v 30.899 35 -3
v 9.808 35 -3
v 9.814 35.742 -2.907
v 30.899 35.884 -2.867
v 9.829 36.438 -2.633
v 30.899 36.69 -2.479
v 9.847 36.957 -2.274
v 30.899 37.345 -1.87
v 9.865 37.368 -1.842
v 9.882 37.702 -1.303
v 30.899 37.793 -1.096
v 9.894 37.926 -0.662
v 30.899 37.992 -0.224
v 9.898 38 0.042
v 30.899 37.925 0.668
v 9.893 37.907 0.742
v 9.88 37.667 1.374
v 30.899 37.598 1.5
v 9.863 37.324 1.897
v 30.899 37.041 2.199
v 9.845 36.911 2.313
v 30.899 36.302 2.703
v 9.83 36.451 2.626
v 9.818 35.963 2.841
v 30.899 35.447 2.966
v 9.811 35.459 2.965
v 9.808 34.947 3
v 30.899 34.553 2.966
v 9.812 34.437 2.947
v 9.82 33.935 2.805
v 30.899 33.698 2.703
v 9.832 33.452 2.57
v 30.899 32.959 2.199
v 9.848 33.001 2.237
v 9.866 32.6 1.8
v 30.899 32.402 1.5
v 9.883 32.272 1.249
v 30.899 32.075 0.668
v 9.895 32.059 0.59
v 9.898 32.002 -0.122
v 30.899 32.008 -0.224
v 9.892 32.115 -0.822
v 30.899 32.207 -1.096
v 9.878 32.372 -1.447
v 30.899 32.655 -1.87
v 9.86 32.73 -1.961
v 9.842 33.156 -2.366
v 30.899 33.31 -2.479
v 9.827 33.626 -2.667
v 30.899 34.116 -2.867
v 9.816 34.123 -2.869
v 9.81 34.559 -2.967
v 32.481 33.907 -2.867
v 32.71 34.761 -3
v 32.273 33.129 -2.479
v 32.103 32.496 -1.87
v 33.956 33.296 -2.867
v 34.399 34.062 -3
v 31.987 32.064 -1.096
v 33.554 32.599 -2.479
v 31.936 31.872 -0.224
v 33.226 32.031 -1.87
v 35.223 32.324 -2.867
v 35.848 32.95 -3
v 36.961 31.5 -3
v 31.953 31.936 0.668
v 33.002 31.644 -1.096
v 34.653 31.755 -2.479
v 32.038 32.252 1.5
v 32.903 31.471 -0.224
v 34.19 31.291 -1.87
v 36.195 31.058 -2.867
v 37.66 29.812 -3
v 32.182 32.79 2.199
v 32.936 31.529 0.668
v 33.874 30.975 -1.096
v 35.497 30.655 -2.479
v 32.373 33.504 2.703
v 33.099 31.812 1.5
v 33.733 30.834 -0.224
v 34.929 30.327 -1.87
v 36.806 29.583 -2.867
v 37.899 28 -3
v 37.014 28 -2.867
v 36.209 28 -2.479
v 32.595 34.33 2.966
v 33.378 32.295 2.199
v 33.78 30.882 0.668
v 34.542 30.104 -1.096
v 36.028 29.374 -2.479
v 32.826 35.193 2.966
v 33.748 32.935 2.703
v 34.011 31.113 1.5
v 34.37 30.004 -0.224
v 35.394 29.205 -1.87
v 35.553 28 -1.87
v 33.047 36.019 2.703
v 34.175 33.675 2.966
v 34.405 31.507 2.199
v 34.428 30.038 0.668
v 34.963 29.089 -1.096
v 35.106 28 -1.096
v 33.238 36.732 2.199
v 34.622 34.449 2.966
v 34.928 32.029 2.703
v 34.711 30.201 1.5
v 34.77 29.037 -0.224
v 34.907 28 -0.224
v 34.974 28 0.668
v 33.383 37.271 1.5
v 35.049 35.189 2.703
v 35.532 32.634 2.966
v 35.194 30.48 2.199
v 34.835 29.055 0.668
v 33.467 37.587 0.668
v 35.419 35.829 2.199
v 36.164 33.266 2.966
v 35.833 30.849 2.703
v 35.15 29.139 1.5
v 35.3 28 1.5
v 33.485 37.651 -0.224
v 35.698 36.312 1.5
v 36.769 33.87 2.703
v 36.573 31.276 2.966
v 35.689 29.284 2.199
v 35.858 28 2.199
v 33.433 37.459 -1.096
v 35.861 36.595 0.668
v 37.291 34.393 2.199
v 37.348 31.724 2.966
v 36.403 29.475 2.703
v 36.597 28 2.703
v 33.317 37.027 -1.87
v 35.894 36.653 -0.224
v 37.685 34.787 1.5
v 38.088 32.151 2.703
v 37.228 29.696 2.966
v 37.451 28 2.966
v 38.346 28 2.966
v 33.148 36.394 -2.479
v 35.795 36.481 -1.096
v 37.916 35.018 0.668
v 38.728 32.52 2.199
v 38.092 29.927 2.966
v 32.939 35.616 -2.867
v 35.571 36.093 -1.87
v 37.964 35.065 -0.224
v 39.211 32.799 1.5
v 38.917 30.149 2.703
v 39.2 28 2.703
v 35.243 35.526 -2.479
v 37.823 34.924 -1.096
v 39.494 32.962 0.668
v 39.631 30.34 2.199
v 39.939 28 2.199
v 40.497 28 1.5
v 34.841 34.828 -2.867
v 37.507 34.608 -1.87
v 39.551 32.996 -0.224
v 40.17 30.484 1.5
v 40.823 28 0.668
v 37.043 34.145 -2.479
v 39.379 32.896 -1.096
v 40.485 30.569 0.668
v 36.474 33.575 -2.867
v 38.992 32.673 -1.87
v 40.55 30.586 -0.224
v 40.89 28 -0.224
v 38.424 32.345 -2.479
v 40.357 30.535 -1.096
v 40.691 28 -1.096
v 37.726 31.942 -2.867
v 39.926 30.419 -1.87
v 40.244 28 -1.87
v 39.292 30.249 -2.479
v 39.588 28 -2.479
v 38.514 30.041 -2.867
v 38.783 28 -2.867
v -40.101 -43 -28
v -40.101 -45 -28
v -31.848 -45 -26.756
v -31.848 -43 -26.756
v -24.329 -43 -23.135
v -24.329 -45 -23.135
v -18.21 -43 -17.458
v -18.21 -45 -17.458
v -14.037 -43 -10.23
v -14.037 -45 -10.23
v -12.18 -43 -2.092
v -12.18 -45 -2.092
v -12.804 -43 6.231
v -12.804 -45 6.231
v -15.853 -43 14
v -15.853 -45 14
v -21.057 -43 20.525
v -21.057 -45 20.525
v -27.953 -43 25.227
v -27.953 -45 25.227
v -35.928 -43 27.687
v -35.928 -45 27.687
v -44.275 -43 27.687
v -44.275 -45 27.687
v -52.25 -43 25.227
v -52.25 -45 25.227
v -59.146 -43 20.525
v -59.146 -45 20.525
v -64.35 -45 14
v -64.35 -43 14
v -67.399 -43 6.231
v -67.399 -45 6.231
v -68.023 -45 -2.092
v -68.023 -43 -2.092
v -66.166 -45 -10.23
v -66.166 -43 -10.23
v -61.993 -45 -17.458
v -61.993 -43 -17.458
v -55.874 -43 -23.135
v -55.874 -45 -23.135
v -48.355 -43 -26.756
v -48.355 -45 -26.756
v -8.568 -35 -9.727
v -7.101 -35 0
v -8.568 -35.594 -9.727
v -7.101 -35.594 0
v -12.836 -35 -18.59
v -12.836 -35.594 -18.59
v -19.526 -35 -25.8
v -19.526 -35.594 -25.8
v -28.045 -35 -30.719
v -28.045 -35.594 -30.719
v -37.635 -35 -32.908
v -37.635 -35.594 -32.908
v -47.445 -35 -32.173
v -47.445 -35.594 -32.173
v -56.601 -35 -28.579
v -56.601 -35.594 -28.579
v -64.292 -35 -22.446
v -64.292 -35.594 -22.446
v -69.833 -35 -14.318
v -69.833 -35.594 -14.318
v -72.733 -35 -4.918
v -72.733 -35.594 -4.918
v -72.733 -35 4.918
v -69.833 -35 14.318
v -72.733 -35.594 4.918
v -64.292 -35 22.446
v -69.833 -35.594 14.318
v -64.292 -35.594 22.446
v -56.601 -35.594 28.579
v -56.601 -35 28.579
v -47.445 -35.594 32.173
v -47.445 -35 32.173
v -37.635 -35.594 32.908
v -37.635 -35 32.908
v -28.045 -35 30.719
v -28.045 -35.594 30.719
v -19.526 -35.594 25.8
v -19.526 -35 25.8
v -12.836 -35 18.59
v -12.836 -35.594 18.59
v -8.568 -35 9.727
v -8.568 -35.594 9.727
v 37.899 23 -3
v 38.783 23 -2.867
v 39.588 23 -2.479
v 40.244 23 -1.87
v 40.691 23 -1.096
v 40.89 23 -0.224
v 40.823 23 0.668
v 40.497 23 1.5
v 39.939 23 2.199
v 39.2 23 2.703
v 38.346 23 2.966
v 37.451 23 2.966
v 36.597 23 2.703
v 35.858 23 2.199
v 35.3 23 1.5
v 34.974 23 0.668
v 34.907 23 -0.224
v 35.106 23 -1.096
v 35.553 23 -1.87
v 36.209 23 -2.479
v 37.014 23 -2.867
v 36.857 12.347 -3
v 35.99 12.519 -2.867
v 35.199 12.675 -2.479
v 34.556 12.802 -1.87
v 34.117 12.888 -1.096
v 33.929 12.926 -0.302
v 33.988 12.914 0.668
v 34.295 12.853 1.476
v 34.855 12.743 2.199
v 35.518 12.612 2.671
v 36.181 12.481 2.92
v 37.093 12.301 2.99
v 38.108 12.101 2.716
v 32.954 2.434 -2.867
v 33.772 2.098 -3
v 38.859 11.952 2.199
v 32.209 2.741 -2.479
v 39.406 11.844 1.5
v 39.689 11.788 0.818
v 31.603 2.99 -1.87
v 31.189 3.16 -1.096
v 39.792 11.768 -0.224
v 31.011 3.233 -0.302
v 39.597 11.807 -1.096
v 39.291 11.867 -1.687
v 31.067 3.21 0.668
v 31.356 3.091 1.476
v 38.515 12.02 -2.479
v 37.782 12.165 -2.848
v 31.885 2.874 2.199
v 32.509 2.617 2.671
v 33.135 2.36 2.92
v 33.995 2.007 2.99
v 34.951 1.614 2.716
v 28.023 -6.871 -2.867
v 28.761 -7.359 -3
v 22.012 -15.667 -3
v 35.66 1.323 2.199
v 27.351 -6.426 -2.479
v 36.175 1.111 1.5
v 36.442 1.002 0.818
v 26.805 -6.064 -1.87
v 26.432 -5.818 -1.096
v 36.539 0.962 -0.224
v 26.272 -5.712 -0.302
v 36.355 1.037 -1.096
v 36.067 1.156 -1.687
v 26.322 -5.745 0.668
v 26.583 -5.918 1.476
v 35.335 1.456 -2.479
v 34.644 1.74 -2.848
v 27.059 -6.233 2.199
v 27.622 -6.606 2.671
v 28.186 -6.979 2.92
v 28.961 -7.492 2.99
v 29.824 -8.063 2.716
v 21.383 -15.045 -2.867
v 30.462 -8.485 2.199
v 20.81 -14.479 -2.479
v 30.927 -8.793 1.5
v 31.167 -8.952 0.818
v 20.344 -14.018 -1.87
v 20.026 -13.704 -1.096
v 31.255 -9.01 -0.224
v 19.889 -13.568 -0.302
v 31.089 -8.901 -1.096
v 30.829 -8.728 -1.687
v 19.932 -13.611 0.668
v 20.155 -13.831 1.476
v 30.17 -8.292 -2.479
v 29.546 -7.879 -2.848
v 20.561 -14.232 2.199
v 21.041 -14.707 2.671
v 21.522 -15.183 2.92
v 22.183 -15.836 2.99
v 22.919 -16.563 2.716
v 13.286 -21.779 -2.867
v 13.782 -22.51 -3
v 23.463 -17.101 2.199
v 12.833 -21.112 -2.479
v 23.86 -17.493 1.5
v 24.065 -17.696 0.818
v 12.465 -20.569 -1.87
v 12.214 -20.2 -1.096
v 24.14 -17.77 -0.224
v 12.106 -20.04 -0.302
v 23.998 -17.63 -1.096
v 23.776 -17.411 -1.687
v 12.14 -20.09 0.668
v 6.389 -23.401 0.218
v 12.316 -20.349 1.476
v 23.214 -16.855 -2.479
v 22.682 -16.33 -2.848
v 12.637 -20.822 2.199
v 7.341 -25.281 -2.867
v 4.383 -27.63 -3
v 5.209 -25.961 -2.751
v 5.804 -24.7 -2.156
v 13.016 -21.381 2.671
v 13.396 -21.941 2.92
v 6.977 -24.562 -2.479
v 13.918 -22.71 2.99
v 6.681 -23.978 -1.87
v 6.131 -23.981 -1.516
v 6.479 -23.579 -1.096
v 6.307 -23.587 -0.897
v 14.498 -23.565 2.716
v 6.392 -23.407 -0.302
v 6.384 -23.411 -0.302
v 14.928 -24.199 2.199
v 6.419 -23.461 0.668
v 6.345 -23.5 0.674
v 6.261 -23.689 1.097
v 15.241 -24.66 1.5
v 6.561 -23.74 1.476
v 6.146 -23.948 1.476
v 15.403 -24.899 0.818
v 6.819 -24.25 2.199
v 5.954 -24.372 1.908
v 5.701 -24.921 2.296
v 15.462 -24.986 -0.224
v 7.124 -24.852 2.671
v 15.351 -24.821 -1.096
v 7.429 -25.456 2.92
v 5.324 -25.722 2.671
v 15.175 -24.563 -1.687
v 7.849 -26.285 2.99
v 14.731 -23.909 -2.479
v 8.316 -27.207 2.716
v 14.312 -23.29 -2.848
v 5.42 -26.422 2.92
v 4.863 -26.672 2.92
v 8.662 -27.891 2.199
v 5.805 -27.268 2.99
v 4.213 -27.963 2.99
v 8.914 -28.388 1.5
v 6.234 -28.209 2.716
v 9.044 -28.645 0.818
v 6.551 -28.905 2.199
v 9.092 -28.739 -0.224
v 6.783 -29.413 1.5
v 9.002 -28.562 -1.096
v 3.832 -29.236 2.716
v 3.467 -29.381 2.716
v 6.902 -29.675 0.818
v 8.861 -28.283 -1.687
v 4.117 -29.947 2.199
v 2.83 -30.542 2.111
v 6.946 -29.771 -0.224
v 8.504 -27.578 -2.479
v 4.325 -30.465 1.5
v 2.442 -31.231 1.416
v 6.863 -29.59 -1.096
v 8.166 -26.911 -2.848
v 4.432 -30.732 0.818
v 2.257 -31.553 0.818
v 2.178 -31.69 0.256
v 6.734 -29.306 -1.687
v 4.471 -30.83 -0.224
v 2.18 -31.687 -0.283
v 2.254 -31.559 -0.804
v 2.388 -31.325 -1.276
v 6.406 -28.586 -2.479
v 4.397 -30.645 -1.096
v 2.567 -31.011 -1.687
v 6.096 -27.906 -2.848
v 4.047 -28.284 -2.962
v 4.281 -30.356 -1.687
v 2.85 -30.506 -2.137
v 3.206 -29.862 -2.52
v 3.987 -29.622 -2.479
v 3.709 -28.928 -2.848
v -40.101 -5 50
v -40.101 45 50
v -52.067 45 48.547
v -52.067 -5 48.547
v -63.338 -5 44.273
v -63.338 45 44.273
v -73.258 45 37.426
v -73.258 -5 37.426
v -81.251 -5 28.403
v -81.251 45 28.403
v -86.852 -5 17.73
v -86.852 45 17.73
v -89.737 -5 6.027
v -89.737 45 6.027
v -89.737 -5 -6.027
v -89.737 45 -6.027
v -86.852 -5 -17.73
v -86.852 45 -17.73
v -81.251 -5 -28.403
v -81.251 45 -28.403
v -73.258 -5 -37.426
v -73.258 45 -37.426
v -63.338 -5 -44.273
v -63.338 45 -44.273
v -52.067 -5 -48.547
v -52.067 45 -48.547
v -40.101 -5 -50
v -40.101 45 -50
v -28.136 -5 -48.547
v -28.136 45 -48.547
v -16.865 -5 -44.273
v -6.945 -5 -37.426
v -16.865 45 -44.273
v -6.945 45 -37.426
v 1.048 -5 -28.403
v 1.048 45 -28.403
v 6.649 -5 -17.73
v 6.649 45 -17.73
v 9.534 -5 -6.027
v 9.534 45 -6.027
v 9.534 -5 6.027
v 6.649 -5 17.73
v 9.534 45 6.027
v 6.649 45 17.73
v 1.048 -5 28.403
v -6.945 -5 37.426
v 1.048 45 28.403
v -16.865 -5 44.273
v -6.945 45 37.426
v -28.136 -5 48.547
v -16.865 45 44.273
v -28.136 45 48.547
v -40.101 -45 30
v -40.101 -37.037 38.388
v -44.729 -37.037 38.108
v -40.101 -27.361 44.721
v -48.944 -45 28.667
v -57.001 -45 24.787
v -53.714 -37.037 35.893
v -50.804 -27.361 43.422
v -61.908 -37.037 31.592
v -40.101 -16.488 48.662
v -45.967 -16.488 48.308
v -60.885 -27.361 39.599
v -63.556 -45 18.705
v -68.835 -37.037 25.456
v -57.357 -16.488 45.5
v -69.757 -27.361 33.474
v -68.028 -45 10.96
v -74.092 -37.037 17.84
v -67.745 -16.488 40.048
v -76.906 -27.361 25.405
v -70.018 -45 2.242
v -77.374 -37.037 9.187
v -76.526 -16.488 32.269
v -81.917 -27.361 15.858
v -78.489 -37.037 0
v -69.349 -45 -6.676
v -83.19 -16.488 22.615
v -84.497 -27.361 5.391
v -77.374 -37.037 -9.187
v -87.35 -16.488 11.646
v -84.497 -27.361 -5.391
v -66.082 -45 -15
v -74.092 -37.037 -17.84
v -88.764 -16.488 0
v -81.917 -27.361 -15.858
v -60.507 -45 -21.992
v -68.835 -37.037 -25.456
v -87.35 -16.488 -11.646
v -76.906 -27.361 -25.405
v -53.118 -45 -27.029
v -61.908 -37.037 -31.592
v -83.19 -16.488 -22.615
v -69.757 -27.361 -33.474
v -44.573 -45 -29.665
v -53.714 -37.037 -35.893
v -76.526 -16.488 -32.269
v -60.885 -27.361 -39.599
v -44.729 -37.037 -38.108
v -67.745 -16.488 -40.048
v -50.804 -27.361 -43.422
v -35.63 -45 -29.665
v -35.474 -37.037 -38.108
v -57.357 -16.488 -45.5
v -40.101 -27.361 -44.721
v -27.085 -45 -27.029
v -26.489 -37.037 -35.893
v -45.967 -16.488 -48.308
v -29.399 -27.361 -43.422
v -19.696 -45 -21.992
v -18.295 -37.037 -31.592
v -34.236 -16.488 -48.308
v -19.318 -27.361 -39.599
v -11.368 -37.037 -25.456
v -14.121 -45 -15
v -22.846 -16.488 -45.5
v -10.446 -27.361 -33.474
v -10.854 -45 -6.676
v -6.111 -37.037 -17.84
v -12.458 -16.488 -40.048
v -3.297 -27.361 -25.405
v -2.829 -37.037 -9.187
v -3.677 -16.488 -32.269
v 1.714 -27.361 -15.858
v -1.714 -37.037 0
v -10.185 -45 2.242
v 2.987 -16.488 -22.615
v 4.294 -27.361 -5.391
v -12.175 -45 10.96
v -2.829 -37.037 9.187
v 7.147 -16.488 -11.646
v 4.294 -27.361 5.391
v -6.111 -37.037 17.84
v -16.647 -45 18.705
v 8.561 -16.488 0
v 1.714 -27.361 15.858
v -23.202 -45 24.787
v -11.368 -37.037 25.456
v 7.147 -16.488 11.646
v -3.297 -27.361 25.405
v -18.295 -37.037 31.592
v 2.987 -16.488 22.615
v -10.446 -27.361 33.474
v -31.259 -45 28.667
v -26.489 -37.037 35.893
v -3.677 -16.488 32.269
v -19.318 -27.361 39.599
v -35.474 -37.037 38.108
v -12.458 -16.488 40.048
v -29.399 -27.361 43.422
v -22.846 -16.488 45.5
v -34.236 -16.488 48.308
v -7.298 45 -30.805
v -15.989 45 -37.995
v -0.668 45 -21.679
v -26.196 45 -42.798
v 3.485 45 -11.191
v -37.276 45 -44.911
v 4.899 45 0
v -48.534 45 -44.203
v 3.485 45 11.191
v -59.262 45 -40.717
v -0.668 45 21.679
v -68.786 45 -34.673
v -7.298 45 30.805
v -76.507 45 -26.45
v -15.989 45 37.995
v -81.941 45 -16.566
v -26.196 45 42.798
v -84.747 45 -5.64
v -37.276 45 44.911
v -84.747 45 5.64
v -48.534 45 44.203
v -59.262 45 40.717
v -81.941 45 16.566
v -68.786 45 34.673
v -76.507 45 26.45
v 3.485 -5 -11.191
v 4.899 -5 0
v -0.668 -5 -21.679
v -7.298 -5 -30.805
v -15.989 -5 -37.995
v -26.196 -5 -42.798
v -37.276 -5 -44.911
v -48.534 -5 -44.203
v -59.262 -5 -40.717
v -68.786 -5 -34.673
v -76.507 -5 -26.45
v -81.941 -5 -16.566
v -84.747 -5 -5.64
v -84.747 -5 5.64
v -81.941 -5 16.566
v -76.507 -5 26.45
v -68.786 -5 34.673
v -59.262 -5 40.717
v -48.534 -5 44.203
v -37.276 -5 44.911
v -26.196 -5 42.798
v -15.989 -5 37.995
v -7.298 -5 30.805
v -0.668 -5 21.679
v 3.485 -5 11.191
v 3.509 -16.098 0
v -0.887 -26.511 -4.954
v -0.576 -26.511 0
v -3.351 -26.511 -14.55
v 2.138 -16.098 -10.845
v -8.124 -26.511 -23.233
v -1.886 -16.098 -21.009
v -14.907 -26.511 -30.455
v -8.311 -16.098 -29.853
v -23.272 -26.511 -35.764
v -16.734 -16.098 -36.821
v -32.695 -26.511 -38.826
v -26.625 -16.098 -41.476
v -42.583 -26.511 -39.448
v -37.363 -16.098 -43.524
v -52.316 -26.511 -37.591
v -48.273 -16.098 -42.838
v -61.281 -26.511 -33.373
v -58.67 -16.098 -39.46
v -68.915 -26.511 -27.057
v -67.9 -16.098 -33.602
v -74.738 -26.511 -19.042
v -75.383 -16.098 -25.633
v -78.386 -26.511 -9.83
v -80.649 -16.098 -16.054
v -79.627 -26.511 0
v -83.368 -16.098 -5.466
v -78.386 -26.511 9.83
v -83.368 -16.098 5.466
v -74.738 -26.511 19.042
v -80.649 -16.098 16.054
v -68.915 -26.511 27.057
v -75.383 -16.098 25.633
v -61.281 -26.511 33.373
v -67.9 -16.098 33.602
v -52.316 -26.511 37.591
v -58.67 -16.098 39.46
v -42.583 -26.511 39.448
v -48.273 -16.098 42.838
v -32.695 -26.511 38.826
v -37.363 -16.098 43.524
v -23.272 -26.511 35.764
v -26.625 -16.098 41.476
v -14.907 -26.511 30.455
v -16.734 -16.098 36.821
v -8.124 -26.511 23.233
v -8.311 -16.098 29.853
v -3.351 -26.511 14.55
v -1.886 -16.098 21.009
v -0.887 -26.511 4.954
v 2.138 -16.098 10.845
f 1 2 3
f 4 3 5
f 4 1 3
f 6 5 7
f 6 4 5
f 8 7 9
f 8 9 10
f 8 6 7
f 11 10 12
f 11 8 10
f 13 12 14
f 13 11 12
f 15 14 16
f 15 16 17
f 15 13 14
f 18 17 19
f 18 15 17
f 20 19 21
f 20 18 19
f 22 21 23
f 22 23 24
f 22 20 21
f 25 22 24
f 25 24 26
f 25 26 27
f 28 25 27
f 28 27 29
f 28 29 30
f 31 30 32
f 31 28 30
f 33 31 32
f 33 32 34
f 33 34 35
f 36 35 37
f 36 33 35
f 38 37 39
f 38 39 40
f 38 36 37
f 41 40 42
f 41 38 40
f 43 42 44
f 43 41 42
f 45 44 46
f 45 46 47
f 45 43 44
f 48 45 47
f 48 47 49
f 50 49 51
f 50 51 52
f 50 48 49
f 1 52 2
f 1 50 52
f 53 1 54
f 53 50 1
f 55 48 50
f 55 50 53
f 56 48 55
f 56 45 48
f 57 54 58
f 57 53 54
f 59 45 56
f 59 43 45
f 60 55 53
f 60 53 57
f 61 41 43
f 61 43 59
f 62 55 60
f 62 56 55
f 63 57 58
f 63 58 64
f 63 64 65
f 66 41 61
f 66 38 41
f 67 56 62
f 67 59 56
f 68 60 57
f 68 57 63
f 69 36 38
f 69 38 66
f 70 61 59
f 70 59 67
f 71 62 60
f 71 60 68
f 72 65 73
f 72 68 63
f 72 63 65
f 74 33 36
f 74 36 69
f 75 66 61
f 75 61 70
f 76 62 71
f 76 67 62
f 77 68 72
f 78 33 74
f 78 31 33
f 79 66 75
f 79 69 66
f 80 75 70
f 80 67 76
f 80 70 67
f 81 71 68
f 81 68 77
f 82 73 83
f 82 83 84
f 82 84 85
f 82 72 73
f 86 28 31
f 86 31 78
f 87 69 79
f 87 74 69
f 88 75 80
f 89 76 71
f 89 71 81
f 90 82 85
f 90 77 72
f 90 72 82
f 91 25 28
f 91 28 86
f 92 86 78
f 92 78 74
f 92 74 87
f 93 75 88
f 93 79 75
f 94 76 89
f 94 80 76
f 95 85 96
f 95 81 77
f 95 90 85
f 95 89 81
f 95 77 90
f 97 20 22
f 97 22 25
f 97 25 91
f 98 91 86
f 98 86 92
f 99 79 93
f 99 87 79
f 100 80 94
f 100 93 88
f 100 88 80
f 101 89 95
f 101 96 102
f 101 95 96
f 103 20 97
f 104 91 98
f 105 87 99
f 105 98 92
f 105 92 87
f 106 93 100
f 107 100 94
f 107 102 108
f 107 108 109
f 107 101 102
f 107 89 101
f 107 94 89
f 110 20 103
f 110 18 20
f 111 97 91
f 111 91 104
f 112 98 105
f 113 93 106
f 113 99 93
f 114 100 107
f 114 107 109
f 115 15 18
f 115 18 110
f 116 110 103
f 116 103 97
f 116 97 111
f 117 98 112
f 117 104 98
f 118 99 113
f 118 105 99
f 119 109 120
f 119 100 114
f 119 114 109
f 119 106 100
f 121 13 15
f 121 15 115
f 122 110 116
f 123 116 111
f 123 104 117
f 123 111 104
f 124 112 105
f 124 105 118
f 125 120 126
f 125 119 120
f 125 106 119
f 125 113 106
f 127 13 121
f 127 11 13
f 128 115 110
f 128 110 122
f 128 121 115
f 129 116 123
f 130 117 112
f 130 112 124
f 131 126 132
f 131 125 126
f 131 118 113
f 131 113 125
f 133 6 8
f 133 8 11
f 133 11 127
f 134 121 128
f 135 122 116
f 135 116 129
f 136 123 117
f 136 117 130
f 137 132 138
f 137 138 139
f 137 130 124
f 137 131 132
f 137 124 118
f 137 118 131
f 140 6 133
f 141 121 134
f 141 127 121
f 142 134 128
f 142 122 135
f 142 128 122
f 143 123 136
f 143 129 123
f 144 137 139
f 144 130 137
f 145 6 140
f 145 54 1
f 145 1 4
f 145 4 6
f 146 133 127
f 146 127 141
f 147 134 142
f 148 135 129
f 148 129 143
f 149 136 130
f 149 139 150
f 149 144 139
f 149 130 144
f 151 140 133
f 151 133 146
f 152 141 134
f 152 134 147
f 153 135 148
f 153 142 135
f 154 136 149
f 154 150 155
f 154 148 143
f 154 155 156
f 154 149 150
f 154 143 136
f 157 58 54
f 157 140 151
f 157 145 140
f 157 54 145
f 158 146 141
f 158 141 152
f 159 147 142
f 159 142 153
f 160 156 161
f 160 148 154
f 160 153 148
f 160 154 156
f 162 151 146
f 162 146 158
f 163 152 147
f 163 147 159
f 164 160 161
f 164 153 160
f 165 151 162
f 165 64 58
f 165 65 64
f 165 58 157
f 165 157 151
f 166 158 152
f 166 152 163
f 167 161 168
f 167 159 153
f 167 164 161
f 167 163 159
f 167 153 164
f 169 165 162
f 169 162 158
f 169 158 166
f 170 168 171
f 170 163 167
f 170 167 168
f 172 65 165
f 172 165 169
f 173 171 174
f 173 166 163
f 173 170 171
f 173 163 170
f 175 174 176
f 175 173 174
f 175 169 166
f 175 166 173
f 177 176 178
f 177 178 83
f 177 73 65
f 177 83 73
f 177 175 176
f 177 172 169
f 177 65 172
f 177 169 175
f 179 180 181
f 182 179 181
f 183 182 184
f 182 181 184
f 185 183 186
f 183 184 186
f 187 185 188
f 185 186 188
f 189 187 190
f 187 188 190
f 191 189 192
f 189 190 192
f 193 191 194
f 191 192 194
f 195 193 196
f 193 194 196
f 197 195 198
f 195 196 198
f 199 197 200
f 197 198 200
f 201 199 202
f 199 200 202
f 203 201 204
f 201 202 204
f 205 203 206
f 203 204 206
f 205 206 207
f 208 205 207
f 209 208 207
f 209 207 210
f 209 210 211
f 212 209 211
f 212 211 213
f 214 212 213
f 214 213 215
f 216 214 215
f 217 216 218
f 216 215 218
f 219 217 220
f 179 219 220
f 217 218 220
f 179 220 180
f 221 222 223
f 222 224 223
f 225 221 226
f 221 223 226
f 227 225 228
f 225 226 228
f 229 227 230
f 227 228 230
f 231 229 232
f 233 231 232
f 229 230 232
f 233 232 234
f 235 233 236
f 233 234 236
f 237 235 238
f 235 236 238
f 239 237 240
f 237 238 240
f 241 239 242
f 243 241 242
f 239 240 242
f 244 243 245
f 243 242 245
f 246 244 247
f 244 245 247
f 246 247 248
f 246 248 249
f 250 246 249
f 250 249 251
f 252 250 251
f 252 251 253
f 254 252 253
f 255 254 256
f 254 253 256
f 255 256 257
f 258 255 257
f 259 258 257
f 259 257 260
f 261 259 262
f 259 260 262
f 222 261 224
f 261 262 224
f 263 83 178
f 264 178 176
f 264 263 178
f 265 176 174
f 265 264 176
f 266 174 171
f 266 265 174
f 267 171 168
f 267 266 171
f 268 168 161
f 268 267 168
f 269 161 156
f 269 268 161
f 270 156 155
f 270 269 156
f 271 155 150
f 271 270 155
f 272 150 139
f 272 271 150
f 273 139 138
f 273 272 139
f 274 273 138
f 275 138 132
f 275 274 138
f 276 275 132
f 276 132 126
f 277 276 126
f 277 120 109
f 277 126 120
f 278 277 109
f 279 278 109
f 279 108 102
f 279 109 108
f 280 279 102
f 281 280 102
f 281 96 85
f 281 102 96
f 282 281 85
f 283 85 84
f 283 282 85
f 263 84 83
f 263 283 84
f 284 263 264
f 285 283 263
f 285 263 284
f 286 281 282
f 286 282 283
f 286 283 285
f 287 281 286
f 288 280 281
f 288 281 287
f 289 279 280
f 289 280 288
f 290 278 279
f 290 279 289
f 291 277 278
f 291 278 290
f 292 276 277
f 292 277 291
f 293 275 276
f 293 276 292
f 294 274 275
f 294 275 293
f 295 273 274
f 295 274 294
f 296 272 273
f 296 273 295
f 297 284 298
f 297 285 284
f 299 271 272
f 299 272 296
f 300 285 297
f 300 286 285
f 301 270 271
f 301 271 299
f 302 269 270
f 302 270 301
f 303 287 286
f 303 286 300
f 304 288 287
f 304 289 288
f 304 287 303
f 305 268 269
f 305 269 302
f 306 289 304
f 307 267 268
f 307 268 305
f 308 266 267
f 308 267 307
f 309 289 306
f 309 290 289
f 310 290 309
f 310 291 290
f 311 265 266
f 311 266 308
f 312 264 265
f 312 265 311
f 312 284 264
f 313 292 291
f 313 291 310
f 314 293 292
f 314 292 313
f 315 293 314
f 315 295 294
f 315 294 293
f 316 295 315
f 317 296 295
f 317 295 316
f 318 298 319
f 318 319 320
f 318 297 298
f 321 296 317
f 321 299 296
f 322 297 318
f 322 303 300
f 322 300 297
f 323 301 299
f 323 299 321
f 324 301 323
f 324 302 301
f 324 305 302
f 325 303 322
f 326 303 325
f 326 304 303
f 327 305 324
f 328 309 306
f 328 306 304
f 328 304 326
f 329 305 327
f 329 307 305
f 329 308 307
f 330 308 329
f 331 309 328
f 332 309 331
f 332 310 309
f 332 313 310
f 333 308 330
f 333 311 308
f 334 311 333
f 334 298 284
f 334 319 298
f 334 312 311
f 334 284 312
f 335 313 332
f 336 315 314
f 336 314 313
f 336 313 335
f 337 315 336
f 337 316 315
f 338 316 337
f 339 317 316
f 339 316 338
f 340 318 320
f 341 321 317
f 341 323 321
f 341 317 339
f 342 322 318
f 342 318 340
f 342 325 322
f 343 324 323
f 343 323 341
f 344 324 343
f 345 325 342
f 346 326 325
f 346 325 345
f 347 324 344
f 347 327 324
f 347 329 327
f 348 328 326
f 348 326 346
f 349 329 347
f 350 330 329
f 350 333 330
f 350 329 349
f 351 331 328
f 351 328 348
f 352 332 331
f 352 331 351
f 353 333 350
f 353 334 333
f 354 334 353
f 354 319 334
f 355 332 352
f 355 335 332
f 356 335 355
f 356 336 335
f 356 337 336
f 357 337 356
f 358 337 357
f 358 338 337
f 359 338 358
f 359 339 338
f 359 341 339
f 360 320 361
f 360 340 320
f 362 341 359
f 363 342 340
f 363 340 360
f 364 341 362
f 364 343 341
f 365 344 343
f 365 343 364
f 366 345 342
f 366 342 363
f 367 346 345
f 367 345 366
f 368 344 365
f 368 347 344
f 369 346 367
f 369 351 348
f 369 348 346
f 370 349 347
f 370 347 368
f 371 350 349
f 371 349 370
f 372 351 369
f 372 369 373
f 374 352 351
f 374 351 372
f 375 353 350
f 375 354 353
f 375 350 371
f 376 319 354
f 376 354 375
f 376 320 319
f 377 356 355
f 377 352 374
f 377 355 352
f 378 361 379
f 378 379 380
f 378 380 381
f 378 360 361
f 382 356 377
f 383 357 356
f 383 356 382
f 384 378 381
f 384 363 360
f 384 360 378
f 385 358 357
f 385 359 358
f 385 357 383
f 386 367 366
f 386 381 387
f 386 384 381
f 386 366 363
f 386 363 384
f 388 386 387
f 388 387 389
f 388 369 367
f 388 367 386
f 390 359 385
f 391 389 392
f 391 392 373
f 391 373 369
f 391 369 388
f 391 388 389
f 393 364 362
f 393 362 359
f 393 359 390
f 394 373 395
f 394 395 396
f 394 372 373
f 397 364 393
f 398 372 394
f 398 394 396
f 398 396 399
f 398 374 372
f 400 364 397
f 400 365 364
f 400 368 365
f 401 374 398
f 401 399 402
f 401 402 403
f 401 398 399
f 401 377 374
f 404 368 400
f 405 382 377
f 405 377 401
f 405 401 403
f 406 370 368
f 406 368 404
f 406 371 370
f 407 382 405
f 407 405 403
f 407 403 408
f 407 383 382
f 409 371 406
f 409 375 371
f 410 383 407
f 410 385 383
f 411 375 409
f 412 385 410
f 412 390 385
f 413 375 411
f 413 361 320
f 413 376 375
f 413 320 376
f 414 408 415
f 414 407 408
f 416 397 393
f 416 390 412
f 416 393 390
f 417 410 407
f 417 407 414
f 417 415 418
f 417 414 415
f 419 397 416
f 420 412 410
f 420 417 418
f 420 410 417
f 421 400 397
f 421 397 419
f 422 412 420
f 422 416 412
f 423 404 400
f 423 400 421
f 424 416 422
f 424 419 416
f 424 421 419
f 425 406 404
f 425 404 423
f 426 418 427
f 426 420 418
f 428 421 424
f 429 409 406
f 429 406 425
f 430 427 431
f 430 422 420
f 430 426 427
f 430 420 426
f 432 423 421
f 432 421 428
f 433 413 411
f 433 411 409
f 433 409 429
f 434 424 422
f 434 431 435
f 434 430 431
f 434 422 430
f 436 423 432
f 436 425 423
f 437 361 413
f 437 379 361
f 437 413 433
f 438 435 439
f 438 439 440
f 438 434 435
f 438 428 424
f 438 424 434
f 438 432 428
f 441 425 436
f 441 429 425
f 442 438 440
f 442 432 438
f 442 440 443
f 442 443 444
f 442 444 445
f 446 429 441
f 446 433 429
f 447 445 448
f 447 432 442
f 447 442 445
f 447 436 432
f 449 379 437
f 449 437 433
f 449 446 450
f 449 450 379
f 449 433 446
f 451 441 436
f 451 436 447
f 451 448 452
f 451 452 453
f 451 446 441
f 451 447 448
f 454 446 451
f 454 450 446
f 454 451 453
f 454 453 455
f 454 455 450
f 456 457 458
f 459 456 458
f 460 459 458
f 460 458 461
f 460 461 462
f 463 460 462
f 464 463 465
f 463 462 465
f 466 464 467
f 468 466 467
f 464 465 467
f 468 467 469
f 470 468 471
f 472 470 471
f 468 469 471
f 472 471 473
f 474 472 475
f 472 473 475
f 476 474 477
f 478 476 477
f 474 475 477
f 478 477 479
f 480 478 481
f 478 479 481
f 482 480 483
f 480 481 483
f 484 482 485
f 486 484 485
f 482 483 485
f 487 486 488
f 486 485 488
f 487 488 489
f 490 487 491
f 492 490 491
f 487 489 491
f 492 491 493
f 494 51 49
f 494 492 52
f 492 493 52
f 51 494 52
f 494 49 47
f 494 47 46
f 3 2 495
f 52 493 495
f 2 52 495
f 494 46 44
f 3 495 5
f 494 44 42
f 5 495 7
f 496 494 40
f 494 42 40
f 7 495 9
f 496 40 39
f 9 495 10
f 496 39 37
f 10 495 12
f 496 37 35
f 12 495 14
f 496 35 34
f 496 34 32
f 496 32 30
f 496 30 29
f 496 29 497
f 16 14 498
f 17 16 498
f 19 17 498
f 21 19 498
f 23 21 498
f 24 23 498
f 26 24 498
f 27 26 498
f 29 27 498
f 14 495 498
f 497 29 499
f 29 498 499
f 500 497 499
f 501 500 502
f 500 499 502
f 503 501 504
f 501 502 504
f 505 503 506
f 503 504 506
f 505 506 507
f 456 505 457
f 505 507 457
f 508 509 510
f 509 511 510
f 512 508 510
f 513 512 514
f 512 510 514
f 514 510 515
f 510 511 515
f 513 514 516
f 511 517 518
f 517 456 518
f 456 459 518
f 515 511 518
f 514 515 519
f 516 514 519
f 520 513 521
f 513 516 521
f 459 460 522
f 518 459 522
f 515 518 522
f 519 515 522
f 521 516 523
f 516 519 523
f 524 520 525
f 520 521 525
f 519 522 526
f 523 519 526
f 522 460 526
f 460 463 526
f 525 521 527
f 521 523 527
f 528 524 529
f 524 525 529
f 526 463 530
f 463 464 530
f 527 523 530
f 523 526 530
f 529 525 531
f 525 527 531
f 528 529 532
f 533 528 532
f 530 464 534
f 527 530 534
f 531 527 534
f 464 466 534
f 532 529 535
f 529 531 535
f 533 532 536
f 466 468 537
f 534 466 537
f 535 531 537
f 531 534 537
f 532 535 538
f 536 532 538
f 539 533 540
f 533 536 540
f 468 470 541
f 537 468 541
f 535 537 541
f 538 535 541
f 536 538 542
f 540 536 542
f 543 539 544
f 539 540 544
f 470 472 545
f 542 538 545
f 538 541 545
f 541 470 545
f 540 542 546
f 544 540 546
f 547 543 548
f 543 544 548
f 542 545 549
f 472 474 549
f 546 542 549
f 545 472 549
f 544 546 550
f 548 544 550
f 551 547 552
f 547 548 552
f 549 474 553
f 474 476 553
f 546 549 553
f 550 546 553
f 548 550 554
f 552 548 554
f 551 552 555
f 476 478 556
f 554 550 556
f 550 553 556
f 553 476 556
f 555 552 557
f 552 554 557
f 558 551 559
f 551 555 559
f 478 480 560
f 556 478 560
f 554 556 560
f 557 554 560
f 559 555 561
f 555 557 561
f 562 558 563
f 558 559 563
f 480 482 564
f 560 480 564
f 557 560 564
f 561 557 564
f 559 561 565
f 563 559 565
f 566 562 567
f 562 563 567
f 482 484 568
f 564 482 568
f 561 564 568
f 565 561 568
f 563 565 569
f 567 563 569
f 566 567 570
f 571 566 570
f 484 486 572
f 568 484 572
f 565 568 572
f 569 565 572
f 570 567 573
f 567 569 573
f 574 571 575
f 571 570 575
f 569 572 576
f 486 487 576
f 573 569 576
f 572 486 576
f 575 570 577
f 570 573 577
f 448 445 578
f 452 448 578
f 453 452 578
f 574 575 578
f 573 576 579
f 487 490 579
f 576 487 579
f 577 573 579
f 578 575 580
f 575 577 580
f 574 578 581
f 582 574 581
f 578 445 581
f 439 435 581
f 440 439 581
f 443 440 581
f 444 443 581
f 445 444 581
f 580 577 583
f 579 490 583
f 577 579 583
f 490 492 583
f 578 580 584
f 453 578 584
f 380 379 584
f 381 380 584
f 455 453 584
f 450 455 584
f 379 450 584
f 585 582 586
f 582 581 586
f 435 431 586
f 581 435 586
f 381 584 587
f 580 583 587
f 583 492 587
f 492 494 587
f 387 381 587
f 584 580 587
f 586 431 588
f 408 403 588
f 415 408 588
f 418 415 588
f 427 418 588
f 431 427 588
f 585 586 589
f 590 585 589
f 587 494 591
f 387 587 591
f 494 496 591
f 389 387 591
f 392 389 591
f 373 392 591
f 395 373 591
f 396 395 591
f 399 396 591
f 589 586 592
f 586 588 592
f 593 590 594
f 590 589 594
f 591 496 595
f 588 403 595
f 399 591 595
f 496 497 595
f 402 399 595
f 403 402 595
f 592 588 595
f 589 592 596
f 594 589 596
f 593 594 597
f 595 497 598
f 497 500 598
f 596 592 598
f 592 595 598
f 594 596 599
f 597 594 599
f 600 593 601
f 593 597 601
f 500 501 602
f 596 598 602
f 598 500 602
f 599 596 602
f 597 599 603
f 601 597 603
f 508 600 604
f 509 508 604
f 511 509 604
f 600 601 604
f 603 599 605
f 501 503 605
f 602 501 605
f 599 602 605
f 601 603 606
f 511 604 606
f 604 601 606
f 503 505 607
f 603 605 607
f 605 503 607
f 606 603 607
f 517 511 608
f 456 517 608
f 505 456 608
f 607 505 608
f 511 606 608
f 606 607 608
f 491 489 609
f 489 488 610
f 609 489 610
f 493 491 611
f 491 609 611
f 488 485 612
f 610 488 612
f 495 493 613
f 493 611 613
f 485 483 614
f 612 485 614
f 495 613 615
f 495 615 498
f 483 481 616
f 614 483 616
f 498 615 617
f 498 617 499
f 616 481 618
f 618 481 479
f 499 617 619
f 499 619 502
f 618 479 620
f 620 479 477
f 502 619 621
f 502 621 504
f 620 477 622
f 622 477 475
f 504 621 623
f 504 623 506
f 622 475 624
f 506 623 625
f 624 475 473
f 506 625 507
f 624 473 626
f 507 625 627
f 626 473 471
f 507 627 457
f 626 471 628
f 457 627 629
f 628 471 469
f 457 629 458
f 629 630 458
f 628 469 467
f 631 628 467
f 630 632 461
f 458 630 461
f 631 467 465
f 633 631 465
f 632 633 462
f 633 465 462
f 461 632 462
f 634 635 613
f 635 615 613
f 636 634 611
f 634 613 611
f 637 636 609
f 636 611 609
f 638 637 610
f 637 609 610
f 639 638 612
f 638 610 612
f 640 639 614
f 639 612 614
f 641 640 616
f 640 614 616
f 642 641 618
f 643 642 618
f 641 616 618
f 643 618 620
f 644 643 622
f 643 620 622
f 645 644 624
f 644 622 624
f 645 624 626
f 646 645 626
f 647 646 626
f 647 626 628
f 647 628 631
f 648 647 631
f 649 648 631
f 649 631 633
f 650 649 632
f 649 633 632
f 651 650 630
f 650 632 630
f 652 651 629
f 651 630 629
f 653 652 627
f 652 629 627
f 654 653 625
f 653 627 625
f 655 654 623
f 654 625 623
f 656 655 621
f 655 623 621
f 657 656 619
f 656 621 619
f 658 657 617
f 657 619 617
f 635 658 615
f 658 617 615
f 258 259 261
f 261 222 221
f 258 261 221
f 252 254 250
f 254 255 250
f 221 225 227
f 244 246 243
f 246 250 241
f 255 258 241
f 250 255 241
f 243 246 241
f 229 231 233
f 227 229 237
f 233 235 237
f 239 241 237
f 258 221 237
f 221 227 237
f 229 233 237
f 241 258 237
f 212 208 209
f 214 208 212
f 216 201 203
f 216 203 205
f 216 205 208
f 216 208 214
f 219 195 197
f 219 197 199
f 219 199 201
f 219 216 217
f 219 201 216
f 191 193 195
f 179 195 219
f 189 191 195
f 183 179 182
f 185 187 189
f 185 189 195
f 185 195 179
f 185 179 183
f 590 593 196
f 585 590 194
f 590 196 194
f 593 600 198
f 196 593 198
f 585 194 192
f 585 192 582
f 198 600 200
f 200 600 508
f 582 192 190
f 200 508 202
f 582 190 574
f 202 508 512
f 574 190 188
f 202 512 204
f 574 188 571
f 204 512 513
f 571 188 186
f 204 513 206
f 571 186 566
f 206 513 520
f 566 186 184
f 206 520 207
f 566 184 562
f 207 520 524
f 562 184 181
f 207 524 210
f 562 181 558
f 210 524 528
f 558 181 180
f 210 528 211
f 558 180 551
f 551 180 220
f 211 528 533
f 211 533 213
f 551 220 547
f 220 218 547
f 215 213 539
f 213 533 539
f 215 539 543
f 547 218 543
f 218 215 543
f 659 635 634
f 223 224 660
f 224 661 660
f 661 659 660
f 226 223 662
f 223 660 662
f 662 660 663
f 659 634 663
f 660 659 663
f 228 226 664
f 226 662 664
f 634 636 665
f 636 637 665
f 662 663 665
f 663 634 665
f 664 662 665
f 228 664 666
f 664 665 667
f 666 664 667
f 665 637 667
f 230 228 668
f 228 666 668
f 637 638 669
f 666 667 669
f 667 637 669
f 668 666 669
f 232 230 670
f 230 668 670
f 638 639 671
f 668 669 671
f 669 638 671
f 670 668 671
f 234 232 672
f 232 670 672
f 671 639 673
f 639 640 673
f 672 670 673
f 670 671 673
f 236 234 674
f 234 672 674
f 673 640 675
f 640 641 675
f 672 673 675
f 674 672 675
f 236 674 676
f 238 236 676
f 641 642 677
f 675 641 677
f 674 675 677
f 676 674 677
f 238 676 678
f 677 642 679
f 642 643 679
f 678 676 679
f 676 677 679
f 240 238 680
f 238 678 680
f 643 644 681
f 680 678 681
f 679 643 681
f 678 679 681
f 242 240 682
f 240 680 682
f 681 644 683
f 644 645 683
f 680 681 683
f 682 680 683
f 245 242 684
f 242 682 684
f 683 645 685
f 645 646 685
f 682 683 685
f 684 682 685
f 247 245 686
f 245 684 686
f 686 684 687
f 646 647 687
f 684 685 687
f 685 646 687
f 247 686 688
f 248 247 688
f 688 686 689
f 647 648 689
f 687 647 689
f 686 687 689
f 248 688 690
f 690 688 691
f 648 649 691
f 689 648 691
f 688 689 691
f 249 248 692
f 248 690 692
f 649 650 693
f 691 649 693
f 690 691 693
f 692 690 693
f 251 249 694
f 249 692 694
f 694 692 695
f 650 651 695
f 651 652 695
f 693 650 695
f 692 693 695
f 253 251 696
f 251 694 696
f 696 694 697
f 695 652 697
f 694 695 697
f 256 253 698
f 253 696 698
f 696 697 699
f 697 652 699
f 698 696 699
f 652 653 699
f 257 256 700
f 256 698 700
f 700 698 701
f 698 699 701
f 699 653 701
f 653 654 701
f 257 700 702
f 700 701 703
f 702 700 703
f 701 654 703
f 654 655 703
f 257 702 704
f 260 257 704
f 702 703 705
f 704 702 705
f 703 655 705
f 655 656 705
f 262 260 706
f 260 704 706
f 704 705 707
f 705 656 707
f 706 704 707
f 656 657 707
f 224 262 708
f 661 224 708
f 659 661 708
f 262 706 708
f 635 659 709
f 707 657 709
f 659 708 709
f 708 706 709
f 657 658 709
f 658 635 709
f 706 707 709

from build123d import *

# Parameters (mm, degrees)
SKETCH11_R         = 3
SKETCH14_R         = 28
CUT_EXTRUDE1_DEPTH = 2


# Read off the part's stored shape, not the designer's step: Shell4
with BuildPart() as part:
    # Sketch2 → Revolve1 (revolve)
    with BuildSketch(Plane.XY, mode=Mode.PRIVATE) as revolve1_sk:
        with BuildLine():
            Line((-40.101497772, 45), (-40.101497772, -45))
            Line((-40.101497772, -45), (-10.101497772, -45))
            ThreePointArc((-10.101497772, -45), (4.619861778, -27.360679775), (9.898502228, -5))
            Line((9.898502228, -5), (9.898502228, 45))
            Line((9.898502228, 45), (-40.101497772, 45))
        make_face()
    revolve(revolve1_sk.sketch.rotate(Axis((-40.101497772, 45, 0), (0, -1, 0)), 90), axis=Axis((-40.101497772, 45, 0), (0, -1, 0)))

    # Sweep16: sweep along a path in Sketch3
    with BuildLine(Plane.XY) as sweep16_path:
        Line((7.898502228, 35), (30.898502228, 35))
        ThreePointArc((30.898502228, 35), (35.848249696, 32.949747468), (37.898502228, 28))
        Line((37.898502228, 28), (37.898502228, 23))
        ThreePointArc((37.898502228, 23), (27.703635862, -8.898275815), (0.898502228, -28.971145841))
    # Sketch11 → Sweep16 (sweep)
    with BuildSketch(Plane(origin=(7.898502228, 0, 0), x_dir=(0, 0, -1), z_dir=(1, 0, 0))):
        with Locations((0, 35)):
            Circle(SKETCH11_R)
    sweep(path=sweep16_path.line)

    # Sketch14 → Cut-Extrude1 (cut)
    with BuildSketch(Plane.XZ.offset(45)):
        with Locations(Location((-40.101497772, 0, 0), (0, 0, 270))):
            Circle(SKETCH14_R)
    extrude(amount=-CUT_EXTRUDE1_DEPTH, mode=Mode.SUBTRACT)

    # Shell4 outline → Shell4 (revolve, cut)
    with BuildSketch(Plane(origin=(-40.101497772, 0, 0), x_dir=(1, 0, 0), z_dir=(0, 0, 1))):
        with BuildLine():
            ThreePointArc((32.999999984, -35.594117098), (41.89272013, -21.431676729), (45, -4.999999985))
            Line((45, -4.999999985), (45, 45))
            Line((45, 45), (0, 45))
            Line((0, 45), (0, -35))
            Line((0, -35), (33, -35))
            Line((33, -35), (32.999999984, -35.594117098))
        make_face()
    revolve(axis=Axis((-40.101497772, 0, 0), (0, 1, 0)), mode=Mode.SUBTRACT)


solid = part.part
